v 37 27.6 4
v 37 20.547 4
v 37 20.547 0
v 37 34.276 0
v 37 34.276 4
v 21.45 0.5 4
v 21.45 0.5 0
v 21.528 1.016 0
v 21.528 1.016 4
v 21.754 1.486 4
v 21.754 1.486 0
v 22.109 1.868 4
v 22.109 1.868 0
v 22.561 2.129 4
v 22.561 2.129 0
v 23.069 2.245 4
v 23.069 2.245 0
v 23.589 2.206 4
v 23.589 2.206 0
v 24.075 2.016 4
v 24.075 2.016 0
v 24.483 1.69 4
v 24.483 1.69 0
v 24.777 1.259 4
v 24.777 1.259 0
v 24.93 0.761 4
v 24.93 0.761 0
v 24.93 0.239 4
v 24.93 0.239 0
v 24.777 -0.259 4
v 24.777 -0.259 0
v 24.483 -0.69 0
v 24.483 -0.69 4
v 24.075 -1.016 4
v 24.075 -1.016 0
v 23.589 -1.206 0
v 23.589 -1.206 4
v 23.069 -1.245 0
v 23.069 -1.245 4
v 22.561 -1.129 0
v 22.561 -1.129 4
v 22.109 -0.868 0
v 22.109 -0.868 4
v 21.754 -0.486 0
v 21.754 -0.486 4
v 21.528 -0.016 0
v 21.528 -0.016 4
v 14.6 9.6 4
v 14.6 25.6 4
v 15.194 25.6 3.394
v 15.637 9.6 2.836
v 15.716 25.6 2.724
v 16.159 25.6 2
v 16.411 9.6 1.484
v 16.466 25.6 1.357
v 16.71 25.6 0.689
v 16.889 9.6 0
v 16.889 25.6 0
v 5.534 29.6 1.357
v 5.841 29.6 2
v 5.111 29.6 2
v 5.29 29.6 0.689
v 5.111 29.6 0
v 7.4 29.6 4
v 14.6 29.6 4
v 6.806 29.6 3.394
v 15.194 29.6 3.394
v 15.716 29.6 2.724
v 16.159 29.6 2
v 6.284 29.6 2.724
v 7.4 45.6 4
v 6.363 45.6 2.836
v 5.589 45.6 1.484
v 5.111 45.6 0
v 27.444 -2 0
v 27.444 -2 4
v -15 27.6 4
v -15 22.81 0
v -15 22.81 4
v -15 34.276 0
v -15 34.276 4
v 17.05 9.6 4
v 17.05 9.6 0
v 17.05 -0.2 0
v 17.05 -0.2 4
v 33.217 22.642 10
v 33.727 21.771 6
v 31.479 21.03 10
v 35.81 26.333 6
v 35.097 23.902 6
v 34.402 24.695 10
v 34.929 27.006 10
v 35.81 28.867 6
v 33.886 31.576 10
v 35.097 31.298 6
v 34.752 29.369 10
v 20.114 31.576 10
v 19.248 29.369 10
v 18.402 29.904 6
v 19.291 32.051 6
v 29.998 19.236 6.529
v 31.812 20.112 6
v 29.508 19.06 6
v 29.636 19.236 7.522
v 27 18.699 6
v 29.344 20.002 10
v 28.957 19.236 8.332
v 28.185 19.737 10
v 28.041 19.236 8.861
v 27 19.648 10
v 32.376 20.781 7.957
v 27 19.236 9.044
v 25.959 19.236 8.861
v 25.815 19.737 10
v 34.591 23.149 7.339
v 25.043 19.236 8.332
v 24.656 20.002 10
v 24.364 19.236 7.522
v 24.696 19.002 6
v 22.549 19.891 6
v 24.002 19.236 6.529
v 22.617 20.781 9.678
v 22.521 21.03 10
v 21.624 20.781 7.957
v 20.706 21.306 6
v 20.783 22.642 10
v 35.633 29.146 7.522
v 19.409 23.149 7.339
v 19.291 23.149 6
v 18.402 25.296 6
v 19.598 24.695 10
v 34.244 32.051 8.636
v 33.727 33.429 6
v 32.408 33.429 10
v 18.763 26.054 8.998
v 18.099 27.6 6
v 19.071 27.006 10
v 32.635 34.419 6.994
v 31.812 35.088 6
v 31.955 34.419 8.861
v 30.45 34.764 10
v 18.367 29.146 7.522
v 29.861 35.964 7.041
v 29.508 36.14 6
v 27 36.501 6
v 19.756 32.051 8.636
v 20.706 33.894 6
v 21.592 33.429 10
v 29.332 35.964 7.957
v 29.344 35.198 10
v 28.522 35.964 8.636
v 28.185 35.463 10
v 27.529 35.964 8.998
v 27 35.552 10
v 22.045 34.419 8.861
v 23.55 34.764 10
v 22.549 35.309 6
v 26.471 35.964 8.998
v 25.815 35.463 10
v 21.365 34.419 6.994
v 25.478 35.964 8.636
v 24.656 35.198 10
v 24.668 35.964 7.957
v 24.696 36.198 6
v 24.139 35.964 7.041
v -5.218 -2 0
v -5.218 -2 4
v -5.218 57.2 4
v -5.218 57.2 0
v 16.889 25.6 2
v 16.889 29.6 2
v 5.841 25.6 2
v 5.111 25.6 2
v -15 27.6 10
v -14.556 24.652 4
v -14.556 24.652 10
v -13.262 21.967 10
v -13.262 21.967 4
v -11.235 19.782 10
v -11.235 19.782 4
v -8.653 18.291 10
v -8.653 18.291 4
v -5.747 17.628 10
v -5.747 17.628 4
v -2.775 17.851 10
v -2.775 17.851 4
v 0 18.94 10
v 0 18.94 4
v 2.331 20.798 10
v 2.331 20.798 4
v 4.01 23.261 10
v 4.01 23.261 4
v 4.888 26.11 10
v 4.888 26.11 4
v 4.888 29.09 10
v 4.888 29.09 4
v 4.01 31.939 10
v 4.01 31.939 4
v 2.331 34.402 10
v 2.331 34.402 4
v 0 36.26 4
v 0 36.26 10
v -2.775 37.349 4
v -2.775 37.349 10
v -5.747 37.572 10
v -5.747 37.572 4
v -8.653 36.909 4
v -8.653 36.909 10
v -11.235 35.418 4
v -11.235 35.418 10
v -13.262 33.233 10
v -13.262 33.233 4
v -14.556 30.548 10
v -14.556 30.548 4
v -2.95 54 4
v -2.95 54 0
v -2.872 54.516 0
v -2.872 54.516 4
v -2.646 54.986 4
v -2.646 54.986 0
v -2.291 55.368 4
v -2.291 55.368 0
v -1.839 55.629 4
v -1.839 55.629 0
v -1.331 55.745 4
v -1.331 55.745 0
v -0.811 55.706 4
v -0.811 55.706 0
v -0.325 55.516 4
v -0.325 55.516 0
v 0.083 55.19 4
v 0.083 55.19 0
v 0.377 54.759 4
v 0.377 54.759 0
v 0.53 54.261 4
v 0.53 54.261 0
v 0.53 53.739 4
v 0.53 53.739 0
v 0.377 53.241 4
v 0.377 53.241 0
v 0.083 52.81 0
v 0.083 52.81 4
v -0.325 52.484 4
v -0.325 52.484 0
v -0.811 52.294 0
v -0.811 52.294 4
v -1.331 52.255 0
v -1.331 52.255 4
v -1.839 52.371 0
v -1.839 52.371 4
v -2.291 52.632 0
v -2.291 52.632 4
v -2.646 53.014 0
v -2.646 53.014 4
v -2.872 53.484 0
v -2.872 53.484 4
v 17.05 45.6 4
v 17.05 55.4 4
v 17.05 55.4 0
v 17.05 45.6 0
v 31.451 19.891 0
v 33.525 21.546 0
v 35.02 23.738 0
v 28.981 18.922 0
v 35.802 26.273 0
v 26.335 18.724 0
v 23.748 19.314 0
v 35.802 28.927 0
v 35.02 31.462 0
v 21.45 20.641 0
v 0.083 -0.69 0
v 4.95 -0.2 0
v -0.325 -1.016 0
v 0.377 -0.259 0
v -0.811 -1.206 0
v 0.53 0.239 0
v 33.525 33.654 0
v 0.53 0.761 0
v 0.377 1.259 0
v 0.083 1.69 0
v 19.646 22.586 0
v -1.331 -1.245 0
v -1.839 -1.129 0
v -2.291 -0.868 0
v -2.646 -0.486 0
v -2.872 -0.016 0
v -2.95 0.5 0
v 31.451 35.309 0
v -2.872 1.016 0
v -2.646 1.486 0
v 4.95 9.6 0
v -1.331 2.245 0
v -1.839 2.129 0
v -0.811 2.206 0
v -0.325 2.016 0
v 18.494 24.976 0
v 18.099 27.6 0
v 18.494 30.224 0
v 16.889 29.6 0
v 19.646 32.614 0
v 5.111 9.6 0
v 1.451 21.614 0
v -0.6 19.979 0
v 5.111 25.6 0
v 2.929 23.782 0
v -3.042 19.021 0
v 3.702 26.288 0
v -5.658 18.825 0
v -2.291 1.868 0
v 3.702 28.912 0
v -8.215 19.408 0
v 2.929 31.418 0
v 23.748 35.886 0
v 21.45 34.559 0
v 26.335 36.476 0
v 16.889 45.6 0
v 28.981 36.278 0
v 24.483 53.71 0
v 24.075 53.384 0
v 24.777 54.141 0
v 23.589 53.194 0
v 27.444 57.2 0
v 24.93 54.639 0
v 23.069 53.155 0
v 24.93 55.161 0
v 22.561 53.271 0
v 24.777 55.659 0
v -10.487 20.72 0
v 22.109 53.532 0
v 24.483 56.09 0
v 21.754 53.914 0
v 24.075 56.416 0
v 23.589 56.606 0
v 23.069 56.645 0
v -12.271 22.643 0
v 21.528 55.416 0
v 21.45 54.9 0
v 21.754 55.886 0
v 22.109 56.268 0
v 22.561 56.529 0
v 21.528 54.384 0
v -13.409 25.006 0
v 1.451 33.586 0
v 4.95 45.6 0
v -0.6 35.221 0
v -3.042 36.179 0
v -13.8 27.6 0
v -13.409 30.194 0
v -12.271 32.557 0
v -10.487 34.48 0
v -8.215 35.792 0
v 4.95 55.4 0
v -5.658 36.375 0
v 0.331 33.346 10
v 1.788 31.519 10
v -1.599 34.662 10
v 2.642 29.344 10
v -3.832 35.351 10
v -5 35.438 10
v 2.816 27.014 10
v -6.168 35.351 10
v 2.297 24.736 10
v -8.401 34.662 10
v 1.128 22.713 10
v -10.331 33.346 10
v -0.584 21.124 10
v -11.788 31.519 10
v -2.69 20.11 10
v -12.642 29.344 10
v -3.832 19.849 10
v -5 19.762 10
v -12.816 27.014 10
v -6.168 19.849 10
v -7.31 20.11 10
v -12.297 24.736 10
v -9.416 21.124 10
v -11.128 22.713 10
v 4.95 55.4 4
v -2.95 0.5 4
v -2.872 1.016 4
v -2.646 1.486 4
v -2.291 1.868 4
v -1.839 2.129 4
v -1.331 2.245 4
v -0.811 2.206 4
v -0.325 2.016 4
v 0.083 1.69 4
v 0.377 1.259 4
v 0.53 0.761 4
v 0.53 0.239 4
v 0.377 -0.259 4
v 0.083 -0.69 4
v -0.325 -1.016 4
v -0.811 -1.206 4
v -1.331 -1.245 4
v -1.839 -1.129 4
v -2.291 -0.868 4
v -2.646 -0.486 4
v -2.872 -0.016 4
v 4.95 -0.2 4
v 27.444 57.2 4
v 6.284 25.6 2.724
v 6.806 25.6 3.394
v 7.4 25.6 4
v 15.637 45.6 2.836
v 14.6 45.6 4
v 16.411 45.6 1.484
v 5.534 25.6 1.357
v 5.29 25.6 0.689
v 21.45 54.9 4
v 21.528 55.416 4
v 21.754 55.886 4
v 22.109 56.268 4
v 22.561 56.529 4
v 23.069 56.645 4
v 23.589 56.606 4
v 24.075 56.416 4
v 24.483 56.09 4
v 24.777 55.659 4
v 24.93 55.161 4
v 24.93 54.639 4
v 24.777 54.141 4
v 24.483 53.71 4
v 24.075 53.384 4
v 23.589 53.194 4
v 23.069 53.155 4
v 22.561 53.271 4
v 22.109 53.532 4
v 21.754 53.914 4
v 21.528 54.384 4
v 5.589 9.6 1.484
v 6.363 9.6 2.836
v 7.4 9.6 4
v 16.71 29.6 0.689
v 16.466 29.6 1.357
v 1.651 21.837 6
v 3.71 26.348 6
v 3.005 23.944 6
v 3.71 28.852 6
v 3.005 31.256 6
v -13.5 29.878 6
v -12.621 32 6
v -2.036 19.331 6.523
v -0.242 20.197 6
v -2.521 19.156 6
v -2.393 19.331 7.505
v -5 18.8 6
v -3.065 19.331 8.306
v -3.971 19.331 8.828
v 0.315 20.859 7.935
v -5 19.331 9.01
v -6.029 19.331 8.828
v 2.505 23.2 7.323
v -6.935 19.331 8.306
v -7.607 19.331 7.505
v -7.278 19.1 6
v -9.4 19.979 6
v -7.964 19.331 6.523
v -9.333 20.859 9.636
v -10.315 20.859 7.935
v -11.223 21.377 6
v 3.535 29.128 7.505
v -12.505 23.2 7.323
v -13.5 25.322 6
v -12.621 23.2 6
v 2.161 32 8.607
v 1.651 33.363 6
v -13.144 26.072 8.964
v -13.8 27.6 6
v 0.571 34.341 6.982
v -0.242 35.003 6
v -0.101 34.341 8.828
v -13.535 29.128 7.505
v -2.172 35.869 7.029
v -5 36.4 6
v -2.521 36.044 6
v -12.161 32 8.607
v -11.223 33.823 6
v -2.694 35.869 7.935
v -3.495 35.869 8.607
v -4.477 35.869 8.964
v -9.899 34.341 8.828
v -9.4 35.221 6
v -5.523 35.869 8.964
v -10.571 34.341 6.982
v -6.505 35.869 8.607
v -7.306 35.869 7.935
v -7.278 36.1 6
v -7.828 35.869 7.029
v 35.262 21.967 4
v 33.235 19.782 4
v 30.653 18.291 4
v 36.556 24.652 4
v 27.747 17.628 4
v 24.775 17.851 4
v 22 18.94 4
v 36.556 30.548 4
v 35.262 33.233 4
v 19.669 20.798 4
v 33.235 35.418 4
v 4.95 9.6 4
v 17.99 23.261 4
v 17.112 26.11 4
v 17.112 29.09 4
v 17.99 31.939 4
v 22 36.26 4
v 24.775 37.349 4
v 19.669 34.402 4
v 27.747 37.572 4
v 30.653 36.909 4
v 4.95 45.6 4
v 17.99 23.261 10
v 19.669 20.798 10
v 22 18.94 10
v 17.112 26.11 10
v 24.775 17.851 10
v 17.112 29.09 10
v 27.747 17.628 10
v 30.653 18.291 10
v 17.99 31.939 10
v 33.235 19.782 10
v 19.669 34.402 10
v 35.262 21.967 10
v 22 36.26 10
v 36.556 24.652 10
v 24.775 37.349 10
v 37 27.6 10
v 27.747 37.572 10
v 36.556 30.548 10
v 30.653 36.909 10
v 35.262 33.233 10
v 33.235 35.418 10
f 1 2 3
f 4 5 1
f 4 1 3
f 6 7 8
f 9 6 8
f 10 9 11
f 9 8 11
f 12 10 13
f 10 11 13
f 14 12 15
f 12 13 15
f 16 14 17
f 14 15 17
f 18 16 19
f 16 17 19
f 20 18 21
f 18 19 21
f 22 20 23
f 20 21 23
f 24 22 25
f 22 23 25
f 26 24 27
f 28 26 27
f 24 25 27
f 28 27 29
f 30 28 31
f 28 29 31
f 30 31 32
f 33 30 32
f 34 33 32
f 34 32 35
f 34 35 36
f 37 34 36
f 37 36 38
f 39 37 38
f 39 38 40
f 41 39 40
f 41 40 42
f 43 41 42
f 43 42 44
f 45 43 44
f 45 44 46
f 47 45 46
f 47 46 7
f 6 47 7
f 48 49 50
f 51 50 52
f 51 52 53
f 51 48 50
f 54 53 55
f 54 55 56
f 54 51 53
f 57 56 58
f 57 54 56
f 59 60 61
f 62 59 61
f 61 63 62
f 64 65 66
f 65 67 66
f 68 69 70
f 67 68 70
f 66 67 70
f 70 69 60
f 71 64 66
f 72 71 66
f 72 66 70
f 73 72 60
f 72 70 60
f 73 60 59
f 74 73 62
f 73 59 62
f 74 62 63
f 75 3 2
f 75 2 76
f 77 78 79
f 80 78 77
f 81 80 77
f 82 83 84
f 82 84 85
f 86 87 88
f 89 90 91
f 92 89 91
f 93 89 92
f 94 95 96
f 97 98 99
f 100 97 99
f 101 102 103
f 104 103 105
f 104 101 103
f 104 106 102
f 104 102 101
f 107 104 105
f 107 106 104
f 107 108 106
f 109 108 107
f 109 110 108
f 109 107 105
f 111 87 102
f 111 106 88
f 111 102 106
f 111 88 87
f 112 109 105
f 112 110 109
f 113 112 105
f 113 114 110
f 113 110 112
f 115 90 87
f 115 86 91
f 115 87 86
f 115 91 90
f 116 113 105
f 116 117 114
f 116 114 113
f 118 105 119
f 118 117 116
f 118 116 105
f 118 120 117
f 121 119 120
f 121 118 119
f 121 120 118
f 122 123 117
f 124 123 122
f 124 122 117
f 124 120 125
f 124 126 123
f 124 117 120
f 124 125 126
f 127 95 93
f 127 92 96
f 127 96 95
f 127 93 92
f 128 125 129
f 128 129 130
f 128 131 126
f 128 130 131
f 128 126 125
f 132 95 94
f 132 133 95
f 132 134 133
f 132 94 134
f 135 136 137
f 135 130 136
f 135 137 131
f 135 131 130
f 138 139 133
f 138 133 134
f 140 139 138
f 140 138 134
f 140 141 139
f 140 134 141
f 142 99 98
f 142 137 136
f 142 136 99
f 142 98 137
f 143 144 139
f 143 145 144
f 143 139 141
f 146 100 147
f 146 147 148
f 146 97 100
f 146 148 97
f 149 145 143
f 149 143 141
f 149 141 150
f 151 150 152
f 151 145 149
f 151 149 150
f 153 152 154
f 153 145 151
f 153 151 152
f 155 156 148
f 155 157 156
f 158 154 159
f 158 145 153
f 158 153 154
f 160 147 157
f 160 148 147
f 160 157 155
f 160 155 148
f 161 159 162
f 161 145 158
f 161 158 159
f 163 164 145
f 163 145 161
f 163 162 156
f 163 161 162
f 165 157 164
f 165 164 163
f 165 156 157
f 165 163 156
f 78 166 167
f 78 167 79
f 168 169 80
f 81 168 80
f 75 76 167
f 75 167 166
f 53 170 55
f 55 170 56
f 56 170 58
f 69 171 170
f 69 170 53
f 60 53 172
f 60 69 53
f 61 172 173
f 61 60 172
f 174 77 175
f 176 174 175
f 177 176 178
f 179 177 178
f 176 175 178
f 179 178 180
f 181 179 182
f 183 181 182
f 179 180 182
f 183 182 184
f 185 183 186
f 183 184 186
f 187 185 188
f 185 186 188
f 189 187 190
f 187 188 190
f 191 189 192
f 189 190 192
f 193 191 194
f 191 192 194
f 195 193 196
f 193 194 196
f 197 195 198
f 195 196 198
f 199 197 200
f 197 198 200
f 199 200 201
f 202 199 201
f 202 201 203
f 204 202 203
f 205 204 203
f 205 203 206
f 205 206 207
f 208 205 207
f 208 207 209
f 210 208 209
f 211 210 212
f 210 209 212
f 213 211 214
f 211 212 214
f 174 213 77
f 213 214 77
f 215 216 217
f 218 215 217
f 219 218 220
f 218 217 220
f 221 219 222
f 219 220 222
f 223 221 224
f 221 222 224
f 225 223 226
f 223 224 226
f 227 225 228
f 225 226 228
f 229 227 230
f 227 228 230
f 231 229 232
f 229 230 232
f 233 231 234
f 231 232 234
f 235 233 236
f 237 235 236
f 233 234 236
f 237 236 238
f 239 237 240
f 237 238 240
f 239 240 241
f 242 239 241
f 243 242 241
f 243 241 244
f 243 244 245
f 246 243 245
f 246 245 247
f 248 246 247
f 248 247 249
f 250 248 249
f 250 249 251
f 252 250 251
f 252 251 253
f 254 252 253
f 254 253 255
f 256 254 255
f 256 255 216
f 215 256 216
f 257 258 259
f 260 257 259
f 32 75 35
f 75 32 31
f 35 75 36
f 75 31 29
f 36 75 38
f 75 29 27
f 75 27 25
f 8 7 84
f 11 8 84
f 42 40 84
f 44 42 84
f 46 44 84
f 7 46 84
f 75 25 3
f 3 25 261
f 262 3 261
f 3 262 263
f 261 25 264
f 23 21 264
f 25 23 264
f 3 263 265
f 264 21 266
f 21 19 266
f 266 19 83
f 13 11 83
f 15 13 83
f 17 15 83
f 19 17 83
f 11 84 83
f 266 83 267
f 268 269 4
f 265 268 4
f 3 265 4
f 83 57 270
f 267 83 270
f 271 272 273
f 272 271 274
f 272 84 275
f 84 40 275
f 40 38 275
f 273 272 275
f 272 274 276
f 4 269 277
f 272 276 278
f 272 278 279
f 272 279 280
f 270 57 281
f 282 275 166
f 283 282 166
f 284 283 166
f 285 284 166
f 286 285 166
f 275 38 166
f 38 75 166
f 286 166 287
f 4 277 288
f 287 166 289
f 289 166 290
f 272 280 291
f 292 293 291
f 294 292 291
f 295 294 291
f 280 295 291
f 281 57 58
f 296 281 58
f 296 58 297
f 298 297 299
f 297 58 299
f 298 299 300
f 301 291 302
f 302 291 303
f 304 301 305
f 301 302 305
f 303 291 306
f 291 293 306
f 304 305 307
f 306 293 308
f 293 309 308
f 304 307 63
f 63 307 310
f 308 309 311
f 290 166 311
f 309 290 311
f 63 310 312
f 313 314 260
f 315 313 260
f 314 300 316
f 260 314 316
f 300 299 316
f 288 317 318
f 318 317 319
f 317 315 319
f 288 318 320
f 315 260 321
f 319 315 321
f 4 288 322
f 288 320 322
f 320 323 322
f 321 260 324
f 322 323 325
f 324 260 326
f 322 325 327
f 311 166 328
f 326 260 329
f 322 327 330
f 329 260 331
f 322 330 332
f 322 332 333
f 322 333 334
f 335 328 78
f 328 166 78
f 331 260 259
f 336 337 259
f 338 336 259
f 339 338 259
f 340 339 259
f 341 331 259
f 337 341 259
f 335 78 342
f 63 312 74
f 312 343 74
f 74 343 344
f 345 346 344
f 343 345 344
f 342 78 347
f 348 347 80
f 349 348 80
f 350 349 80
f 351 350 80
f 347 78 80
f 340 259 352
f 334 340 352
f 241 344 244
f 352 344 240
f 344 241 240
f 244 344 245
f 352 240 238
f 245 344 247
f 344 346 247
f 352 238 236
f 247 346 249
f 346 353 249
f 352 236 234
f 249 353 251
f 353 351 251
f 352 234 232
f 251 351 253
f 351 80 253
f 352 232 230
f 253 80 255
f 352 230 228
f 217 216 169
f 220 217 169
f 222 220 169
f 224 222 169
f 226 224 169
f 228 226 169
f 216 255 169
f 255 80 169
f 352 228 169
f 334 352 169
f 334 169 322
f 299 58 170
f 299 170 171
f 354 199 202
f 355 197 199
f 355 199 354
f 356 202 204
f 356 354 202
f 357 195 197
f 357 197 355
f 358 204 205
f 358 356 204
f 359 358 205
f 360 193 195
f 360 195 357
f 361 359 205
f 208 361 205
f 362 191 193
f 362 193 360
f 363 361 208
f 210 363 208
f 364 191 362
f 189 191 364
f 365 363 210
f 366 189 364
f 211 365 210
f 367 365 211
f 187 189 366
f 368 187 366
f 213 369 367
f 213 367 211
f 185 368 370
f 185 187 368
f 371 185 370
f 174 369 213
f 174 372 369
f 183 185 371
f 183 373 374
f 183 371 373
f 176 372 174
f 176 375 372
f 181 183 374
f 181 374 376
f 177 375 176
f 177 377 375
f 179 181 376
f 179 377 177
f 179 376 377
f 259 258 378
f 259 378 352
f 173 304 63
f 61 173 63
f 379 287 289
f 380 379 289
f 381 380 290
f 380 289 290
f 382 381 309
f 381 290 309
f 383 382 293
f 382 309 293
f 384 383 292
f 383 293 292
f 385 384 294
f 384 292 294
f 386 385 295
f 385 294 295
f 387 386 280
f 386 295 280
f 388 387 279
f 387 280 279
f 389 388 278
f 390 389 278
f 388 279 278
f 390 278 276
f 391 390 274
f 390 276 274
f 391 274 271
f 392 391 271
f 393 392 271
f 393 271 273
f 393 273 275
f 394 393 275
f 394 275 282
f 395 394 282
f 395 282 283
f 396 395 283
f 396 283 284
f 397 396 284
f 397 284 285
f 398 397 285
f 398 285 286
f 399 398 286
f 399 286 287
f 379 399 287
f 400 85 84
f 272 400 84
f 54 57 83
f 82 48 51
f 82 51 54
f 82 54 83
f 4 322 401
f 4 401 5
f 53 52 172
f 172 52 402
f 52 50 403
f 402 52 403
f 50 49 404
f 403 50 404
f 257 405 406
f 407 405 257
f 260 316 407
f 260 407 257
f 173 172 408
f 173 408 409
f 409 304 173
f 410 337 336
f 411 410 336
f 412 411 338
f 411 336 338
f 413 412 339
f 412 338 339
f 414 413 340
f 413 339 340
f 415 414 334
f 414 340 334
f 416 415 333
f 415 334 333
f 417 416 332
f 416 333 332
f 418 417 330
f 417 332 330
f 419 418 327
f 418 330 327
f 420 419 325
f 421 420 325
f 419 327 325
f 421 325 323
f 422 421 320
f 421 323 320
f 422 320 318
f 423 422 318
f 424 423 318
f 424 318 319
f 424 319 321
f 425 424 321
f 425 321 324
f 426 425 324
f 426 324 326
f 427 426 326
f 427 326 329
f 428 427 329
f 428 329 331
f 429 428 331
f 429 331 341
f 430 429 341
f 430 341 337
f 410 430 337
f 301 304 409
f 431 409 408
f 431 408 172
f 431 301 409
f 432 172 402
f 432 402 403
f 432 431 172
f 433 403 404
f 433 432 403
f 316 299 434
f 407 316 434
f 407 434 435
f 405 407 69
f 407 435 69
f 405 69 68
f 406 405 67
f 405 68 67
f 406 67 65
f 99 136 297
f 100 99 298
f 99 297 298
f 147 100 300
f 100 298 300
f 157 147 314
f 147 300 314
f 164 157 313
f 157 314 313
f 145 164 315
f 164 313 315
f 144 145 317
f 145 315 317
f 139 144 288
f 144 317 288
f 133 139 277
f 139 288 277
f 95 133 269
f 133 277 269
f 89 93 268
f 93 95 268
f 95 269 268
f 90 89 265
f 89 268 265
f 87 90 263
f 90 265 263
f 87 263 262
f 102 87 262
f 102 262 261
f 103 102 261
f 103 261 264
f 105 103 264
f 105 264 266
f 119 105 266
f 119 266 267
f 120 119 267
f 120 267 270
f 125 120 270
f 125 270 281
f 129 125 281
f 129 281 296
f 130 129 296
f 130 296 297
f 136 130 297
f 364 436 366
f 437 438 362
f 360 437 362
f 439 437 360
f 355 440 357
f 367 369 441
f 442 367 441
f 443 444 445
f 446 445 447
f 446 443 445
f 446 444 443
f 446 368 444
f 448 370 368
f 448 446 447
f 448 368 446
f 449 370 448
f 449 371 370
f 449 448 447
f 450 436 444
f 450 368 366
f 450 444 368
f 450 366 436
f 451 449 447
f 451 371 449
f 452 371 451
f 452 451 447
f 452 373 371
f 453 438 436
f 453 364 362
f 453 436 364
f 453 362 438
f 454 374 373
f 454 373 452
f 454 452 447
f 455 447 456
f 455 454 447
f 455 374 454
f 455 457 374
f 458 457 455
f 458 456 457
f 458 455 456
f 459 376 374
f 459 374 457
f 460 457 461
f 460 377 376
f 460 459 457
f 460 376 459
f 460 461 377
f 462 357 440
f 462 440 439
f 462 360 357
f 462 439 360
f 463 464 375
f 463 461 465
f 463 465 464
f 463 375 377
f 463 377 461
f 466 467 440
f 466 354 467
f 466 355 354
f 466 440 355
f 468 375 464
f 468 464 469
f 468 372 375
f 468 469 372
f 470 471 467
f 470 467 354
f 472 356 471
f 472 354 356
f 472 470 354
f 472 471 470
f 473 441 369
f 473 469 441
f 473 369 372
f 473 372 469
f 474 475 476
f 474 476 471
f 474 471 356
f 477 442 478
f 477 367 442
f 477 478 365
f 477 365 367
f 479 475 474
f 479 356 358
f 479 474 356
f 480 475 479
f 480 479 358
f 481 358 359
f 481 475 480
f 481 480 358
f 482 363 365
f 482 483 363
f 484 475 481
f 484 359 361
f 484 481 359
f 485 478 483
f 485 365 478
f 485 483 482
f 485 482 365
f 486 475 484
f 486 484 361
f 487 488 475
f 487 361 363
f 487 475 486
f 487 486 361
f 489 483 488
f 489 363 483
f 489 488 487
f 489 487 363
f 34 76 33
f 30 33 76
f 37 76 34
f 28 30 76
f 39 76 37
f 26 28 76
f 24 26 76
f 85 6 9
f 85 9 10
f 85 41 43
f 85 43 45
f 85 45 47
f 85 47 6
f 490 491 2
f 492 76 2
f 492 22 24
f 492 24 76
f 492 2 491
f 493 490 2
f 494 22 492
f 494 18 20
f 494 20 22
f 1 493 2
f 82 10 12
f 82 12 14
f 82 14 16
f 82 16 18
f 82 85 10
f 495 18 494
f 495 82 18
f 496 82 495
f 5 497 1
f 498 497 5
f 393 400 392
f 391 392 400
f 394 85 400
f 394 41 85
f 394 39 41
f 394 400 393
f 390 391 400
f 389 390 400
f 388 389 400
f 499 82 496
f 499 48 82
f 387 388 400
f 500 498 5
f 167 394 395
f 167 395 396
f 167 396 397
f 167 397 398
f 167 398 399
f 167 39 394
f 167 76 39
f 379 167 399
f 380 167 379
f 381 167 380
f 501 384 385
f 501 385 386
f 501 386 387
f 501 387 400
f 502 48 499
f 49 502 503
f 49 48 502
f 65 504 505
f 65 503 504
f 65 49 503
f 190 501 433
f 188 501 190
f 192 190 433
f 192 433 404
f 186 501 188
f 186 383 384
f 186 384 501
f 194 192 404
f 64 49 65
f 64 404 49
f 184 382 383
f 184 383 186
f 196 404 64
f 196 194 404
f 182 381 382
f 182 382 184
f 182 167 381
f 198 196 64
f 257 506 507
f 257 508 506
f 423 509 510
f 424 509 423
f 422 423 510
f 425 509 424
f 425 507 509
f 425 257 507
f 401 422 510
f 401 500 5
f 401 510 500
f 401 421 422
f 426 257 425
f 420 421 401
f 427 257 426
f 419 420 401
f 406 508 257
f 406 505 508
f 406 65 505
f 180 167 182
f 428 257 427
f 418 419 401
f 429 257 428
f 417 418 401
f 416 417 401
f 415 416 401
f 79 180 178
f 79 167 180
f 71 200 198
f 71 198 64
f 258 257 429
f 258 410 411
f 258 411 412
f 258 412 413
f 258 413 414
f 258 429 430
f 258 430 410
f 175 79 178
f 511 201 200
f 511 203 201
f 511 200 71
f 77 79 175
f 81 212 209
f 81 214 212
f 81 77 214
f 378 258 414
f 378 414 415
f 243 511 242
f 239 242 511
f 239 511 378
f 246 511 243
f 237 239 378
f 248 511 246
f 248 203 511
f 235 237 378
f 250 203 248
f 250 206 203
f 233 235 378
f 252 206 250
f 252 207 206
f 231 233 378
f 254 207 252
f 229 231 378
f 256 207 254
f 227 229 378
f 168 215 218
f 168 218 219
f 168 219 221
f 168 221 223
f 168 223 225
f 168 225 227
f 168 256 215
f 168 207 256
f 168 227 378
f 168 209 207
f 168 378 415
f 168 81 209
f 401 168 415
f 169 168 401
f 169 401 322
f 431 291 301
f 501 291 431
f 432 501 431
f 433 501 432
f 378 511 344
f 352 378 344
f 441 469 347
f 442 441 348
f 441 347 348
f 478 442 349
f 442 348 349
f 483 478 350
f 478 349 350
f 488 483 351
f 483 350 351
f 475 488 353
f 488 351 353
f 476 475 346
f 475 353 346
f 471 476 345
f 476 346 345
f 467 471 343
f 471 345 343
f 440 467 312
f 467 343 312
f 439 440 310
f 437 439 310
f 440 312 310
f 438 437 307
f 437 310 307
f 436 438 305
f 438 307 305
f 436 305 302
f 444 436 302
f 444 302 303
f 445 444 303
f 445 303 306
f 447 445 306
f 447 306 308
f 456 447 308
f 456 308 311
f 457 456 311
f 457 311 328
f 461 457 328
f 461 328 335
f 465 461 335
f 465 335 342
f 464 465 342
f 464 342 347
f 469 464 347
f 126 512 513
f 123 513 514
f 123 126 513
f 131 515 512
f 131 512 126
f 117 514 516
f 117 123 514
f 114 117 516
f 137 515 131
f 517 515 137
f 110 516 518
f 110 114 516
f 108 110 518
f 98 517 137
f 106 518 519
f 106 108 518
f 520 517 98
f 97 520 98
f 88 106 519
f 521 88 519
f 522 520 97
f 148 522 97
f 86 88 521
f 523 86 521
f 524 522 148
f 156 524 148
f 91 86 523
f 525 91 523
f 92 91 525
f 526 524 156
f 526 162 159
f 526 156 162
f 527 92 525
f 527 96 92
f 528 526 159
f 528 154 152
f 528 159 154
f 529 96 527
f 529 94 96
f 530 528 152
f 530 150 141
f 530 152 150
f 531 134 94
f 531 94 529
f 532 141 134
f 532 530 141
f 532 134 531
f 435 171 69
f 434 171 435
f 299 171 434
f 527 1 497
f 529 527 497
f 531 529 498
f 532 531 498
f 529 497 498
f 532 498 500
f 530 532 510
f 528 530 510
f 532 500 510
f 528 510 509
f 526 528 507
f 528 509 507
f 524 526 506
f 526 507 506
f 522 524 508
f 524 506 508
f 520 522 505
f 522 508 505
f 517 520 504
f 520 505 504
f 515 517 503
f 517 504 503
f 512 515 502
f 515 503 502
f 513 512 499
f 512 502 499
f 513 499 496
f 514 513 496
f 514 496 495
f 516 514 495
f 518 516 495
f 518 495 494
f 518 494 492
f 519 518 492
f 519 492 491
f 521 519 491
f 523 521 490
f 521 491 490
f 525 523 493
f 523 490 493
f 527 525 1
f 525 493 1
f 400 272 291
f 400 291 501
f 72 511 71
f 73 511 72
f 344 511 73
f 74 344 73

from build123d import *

# Parameters (mm, degrees)
CROQUIS1_W               = 22
CROQUIS1_H               = 55.2
SALIENTE_EXTRUIR1_DEPTH  = 4
CROQUIS2_W               = 12.1
CROQUIS2_H               = 4
CORTAR_EXTRUIR1_DEPTH    = 9.6
CROQUIS3_W               = 12.1
CROQUIS3_H               = 4
CORTAR_EXTRUIR2_DEPTH    = 9.6
CORTAR_EXTRUIR3_DEPTH    = 16
CORTAR_EXTRUIR4_START    = -16
CORTAR_EXTRUIR4_DEPTH    = 16
CROQUIS9_W               = 11.778481694
CROQUIS9_H               = 4
CORTAR_EXTRUIR5_DEPTH    = 2
CROQUIS11_W              = 4.95
CROQUIS11_H              = 4
SALIENTE_EXTRUIR3_DEPTH  = 2
CROQUIS12_W              = 4
CROQUIS12_H              = 1.8
SALIENTE_EXTRUIR4_DEPTH  = 12.1
CROQUIS13_W              = 4.95
CROQUIS13_H              = 4
SALIENTE_EXTRUIR5_DEPTH  = 2
CROQUIS14_W              = 4
CROQUIS14_H              = 1.8
SALIENTE_EXTRUIR6_DEPTH  = 12.1
CROQUIS17_W              = 4
CROQUIS17_H              = 59.2
SALIENTE_EXTRUIR8_DEPTH  = 15
CROQUIS18_W              = 4
CROQUIS18_H              = 59.2
SALIENTE_EXTRUIR9_DEPTH  = 15
CROQUIS19_R              = 1.75
CORTAR_EXTRUIR6_DEPTH    = 11.5
CROQUIS20_R              = 8.8
CROQUIS20_R_2            = 8.901027098
CORTAR_EXTRUIR7_DEPTH    = 4
CROQUIS22_R              = 10
SALIENTE_EXTRUIR10_DEPTH = 6
CORTAR_EXTRUIR8_DEPTH    = 10
CROQUIS26_R              = 8.901027098
CROQUIS26_R_2            = 8.8
CORTAR_EXTRUIR9_DEPTH    = 2


with BuildPart() as part:
    # Croquis1 → Saliente-Extruir1 (new body)
    with BuildSketch(Plane.XY):
        with Locations((11, 27.6)):
            Rectangle(CROQUIS1_W, CROQUIS1_H)
    extrude(amount=SALIENTE_EXTRUIR1_DEPTH)

    # Croquis2 → Cortar-Extruir1 (cut)
    with BuildSketch(Plane(origin=(0, 55.2, 0), x_dir=(1, 0, 0), z_dir=(0, 1, 0))):
        with Locations((11, -2)):
            Rectangle(CROQUIS2_W, CROQUIS2_H)
    extrude(amount=-CORTAR_EXTRUIR1_DEPTH, mode=Mode.SUBTRACT)

    # Croquis3 → Cortar-Extruir2 (cut)
    with BuildSketch(Plane.XZ):
        with Locations((11, 2)):
            Rectangle(CROQUIS3_W, CROQUIS3_H)
    extrude(amount=-CORTAR_EXTRUIR2_DEPTH, mode=Mode.SUBTRACT)

    # Croquis5 → Cortar-Extruir3 (cut)
    with BuildSketch(Plane.XZ.offset(-9.6)):
        with BuildLine():
            Line((7.4, 4), (14.6, 4))
            ThreePointArc((14.6, 4), (16.401151853, 1.506649462), (17.05, -1.5))
            Line((17.05, -1.5), (4.95, -1.5))
            ThreePointArc((4.95, -1.5), (5.598848147, 1.506649462), (7.4, 4))
        make_face()
    extrude(amount=-CORTAR_EXTRUIR3_DEPTH, mode=Mode.SUBTRACT)

    # Croquis7 → Cortar-Extruir4 (cut)
    with BuildSketch(Plane(origin=(0, 45.6, 0), x_dir=(1, 0, 0), z_dir=(0, 1, 0)).offset(CORTAR_EXTRUIR4_START)):
        with BuildLine():
            Line((4.95, 1.5), (17.05, 1.5))
            ThreePointArc((17.05, 1.5), (16.401151853, -1.506649462), (14.6, -4))
            Line((14.6, -4), (7.4, -4))
            ThreePointArc((7.4, -4), (5.598848147, -1.506649462), (4.95, 1.5))
        make_face()
    extrude(amount=CORTAR_EXTRUIR4_DEPTH, mode=Mode.SUBTRACT)

    # Croquis9 → Cortar-Extruir5 (cut)
    with BuildSketch(Plane(origin=(0, 0, 0), x_dir=(-1, 0, 0), z_dir=(0, 0, -1))):
        with Locations((-11, 27.6)):
            Rectangle(CROQUIS9_W, CROQUIS9_H)
    extrude(amount=-CORTAR_EXTRUIR5_DEPTH, mode=Mode.SUBTRACT)

    # Croquis11 → Saliente-Extruir3 (add)
    with BuildSketch(Plane(origin=(0, 55.2, 0), x_dir=(1, 0, 0), z_dir=(0, 1, 0))):
        with Locations((2.475, -2)):
            Rectangle(CROQUIS11_W, CROQUIS11_H)
        with Locations((19.525, -2)):
            Rectangle(CROQUIS11_W, CROQUIS11_H)
    extrude(amount=SALIENTE_EXTRUIR3_DEPTH)

    # Croquis12 → Saliente-Extruir4 (add)
    with BuildSketch(Plane(origin=(4.95, 0, 0), x_dir=(0, 0, -1), z_dir=(1, 0, 0))):
        with Locations((-2, 56.3)):
            Rectangle(CROQUIS12_W, CROQUIS12_H)
    extrude(amount=SALIENTE_EXTRUIR4_DEPTH)

    # Croquis13 → Saliente-Extruir5 (add)
    with BuildSketch(Plane.XZ):
        with Locations((19.525, 2)):
            Rectangle(CROQUIS13_W, CROQUIS13_H)
        with Locations((2.475, 2)):
            Rectangle(CROQUIS13_W, CROQUIS13_H)
    extrude(amount=SALIENTE_EXTRUIR5_DEPTH)

    # Croquis14 → Saliente-Extruir6 (add)
    with BuildSketch(Plane(origin=(4.95, 0, 0), x_dir=(0, 0, -1), z_dir=(1, 0, 0))):
        with Locations((-2, -1.1)):
            Rectangle(CROQUIS14_W, CROQUIS14_H)
    extrude(amount=SALIENTE_EXTRUIR6_DEPTH)

    # Croquis17 → Saliente-Extruir8 (add)
    with BuildSketch(Plane.ZY):
        with Locations((2, 27.6)):
            Rectangle(CROQUIS17_W, CROQUIS17_H)
    extrude(amount=SALIENTE_EXTRUIR8_DEPTH)

    # Croquis18 → Saliente-Extruir9 (add)
    with BuildSketch(Plane(origin=(22, 0, 0), x_dir=(0, 0, -1), z_dir=(1, 0, 0))):
        with Locations((-2, 27.6)):
            Rectangle(CROQUIS18_W, CROQUIS18_H)
    extrude(amount=SALIENTE_EXTRUIR9_DEPTH)

    # Croquis19 → Cortar-Extruir6 (cut)
    with BuildSketch(Plane(origin=(0, 0, 0), x_dir=(-1, 0, 0), z_dir=(0, 0, -1))):
        with Locations((-23.2, 54.9)):
            Circle(CROQUIS19_R)
        with Locations((1.2, 54)):
            Circle(CROQUIS19_R)
        with Locations((1.2, 0.5)):
            Circle(CROQUIS19_R)
        with Locations((-23.2, 0.5)):
            Circle(CROQUIS19_R)
    extrude(amount=-CORTAR_EXTRUIR6_DEPTH, mode=Mode.SUBTRACT)

    # Croquis20 → Cortar-Extruir7 (cut)
    with BuildSketch(Plane(origin=(0, 0, 0), x_dir=(-1, 0, 0), z_dir=(0, 0, -1))):
        with Locations((5, 27.6)):
            Circle(CROQUIS20_R)
        with Locations((-27, 27.6)):
            Circle(CROQUIS20_R_2)
    extrude(amount=-CORTAR_EXTRUIR7_DEPTH, mode=Mode.SUBTRACT)

    # Croquis22 → Saliente-Extruir10 (add)
    with BuildSketch(Plane.XY.offset(4)):
        with Locations(Location((-5, 27.6, 0), (0, 0, 180))):
            Circle(CROQUIS22_R)
        with Locations((27, 27.6)):
            Circle(CROQUIS22_R)
    extrude(amount=SALIENTE_EXTRUIR10_DEPTH)

    # Croquis25 → Cortar-Extruir8 (cut)
    with BuildSketch(Plane(origin=(0, 0, 0), x_dir=(-1, 0, 0), z_dir=(0, 0, -1))):
        Polygon((-27.444270401, 57.2), (-37, 34.275770323), (-37, 57.2), align=None)
        Polygon((5.217973102, 57.2), (15, 34.275770323), (15, 57.2), align=None)
        Polygon((-37, 20.547067511), (-27.444270401, -2), (-37, -2), align=None)
        Polygon((5.217973102, -2), (15, 22.810040502), (15, -2), align=None)
    extrude(amount=-CORTAR_EXTRUIR8_DEPTH, mode=Mode.SUBTRACT)

    # Croquis26 → Cortar-Extruir9 (cut)
    with BuildSketch(Plane(origin=(0, 0, 4), x_dir=(-1, 0, 0), z_dir=(0, 0, -1))):
        with Locations((-27, 27.6)):
            Circle(CROQUIS26_R)
        with Locations((5, 27.6)):
            Circle(CROQUIS26_R_2)
    extrude(amount=-CORTAR_EXTRUIR9_DEPTH, mode=Mode.SUBTRACT)

    # Croquis27 → Cortar-Revolución1 (revolve, cut)
    with BuildSketch(Plane(origin=(0, 0, 6), x_dir=(-1, 0, 0), z_dir=(0, 0, -1))):
        with BuildLine():
            Line((5, 36.4), (5, 18.8))
            ThreePointArc((5, 18.8), (13.8, 27.6), (5, 36.4))
        make_face()
    revolve(axis=Axis((-5, 36.4, 6), (0, -1, 0)), mode=Mode.SUBTRACT)

    # Croquis28 → Cortar-Revolución2 (revolve, cut)
    with BuildSketch(Plane(origin=(0, 0, 6), x_dir=(-1, 0, 0), z_dir=(0, 0, -1))):
        with BuildLine():
            Line((-27, 36.501027098), (-27, 18.698972902))
            ThreePointArc((-27, 18.698972902), (-35.901027098, 27.6), (-27, 36.501027098))
        make_face()
    revolve(axis=Axis((27, 36.501027098, 6), (0, -1, 0)), mode=Mode.SUBTRACT)


solid = part.part
